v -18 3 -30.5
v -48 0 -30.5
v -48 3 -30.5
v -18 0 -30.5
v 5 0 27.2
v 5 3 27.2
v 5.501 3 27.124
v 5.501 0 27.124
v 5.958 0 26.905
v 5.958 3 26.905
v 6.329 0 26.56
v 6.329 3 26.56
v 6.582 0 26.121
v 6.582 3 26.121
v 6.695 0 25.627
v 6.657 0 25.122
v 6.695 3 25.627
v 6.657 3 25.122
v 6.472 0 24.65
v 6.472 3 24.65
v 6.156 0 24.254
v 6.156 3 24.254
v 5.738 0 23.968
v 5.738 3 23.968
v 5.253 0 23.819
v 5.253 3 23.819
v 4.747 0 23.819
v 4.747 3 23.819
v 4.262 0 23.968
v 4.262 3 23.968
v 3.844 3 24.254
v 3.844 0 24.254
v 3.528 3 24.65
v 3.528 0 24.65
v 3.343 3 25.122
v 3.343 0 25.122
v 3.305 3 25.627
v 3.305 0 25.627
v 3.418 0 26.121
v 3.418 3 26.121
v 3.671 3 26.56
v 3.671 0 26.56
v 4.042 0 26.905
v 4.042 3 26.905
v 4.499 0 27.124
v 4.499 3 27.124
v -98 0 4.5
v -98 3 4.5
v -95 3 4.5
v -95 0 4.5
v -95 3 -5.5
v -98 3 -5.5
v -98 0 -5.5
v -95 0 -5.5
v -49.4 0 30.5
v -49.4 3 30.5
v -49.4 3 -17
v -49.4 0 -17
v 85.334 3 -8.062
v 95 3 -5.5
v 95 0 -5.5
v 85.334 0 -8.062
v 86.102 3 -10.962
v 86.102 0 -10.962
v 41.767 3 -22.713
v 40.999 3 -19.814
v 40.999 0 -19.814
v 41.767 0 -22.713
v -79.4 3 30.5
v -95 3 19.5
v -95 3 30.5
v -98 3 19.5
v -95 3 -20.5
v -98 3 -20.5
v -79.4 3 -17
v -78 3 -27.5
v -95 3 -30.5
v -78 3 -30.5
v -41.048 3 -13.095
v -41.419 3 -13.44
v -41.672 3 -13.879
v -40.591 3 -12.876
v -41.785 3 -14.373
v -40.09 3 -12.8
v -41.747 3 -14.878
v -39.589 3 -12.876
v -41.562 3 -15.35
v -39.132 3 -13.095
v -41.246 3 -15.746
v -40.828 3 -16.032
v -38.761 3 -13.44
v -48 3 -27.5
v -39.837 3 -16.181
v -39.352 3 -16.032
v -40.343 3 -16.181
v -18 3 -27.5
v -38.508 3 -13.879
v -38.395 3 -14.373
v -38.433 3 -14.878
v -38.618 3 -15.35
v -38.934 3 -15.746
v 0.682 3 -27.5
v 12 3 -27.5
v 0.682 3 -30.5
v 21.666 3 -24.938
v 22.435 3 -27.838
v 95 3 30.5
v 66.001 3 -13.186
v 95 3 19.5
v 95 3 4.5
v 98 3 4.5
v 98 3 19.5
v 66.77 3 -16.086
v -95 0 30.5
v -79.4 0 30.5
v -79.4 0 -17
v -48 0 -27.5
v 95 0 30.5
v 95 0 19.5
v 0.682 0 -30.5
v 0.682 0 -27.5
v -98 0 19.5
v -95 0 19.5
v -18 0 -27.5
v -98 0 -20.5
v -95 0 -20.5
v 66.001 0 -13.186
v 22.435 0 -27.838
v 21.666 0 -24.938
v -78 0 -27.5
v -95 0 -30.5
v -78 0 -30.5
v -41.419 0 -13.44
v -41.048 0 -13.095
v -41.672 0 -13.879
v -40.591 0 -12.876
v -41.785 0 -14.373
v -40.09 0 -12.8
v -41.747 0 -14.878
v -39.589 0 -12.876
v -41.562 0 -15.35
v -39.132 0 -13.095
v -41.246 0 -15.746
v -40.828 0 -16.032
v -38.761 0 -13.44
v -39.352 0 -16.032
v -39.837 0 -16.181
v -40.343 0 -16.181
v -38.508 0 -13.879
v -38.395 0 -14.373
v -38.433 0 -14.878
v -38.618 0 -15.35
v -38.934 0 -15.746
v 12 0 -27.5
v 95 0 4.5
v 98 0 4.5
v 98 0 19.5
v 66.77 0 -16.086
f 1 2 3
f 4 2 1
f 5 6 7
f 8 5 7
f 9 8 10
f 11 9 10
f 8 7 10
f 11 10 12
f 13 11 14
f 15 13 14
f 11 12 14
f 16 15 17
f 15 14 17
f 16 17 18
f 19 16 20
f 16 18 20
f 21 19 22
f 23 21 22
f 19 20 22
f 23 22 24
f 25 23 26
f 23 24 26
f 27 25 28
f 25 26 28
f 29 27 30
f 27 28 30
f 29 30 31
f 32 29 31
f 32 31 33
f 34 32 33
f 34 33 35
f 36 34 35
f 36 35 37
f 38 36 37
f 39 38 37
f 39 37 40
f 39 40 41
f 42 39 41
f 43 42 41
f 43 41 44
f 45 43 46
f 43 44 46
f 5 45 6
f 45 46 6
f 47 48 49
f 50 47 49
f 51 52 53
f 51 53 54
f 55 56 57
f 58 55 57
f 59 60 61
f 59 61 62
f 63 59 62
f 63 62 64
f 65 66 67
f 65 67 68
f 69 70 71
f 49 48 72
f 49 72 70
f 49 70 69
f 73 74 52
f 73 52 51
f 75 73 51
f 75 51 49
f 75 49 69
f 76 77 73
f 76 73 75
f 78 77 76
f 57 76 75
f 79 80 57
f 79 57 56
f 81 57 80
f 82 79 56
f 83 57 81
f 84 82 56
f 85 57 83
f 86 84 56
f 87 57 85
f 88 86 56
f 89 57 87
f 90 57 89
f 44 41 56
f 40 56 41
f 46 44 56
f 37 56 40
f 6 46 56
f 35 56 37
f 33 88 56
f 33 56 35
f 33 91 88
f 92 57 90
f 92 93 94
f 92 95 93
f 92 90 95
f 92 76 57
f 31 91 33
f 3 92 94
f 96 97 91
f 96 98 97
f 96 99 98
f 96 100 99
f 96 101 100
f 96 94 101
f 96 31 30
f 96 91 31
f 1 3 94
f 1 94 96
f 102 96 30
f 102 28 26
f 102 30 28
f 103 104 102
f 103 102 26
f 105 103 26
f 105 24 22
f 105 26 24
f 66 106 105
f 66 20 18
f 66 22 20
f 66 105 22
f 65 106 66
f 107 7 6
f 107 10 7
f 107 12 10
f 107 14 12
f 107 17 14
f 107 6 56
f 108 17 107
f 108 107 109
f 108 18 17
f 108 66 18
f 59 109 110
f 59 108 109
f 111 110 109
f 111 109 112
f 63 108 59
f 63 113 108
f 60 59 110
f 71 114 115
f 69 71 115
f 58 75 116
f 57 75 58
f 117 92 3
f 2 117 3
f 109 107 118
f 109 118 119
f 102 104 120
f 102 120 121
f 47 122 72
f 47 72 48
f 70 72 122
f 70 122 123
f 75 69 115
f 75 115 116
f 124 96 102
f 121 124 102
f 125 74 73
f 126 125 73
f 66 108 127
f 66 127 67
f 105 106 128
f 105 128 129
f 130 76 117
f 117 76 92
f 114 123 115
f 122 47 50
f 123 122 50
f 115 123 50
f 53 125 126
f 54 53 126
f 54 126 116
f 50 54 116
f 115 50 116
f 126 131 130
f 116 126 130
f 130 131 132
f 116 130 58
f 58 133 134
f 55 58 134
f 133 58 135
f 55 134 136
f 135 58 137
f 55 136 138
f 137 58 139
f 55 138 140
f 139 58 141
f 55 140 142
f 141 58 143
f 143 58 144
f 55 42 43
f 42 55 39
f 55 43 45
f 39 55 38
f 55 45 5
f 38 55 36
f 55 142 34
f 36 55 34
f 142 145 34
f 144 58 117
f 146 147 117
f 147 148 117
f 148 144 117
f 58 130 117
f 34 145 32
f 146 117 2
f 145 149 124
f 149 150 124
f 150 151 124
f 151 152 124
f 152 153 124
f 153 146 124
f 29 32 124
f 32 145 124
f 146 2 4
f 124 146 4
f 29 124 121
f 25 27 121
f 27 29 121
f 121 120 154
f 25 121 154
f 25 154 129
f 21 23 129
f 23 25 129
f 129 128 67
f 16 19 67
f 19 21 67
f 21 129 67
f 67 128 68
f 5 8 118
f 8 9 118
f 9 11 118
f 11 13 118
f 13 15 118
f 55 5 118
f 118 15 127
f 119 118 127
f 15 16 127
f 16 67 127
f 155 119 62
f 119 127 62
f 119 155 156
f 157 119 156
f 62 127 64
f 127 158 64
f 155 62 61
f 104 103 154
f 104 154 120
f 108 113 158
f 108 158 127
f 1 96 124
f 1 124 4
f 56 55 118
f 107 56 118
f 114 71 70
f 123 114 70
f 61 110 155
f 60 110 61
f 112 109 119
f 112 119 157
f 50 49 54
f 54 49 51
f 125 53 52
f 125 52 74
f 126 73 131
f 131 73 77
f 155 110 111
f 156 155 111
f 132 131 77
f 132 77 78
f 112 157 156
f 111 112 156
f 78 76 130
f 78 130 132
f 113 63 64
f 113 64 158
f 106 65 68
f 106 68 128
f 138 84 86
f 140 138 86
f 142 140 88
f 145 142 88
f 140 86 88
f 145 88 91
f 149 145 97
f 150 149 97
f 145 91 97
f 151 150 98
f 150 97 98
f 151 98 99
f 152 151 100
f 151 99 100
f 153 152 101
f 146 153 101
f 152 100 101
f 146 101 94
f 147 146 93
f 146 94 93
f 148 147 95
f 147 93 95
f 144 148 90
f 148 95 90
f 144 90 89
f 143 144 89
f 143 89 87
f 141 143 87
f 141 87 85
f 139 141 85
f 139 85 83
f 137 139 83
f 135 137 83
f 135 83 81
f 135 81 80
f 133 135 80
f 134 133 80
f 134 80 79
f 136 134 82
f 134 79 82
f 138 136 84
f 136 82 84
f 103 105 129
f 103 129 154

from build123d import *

# Parameters (mm, degrees)
SKETCH1_W           = 196
SKETCH1_H           = 61
BOSS_EXTRUDE1_DEPTH = 3
SKETCH2_R           = 1.7
SKETCH2_W           = 30
SKETCH2_H           = 47.5
SKETCH2_W_2         = 3
SKETCH2_H_2         = 10
SKETCH2_H_3         = 11
SKETCH2_H_4         = 3
CUT_EXTRUDE1_DEPTH  = 3
CUT_EXTRUDE2_DEPTH  = 10
BOSS_EXTRUDE2_DEPTH = 3


with BuildPart() as part:
    # Sketch1 → Boss-Extrude1 (new body)
    with BuildSketch(Plane(origin=(0, 0, 0), x_dir=(1, 0, 0), z_dir=(0, 1, 0))):
        Rectangle(SKETCH1_W, SKETCH1_H)
    extrude(amount=BOSS_EXTRUDE1_DEPTH)

    # Sketch2 → Cut-Extrude1 (cut)
    with BuildSketch(Plane(origin=(0, 3, 0), x_dir=(1, 0, 0), z_dir=(0, 1, 0))):
        with Locations(Location((-40.09, 14.5, 0), (0, 0, 270))):
            Circle(SKETCH2_R)
        with Locations(Location((5, -25.5, 0), (0, 0, 270))):
            Circle(SKETCH2_R)
        with Locations((-64.4, -6.75)):
            Rectangle(SKETCH2_W, SKETCH2_H)
        with Locations((-96.5, 25.5)):
            Rectangle(SKETCH2_W_2, SKETCH2_H_2)
        with Locations((-96.5, 0.5)):
            Rectangle(SKETCH2_W_2, SKETCH2_H_2)
        with Locations((-96.5, -25)):
            Rectangle(SKETCH2_W_2, SKETCH2_H_3)
        with Locations((96.5, 0.5)):
            Rectangle(SKETCH2_W_2, SKETCH2_H_2)
        with Locations((96.5, -25)):
            Rectangle(SKETCH2_W_2, SKETCH2_H_3)
        with Locations((-3, 29)):
            Rectangle(SKETCH2_W, SKETCH2_H_4)
        with Locations((-63, 29)):
            Rectangle(SKETCH2_W, SKETCH2_H_4)
        with Locations((57, 29)):
            Rectangle(SKETCH2_W, SKETCH2_H_4)
        with Locations((96.5, 25.5)):
            Rectangle(SKETCH2_W_2, SKETCH2_H_2)
    extrude(amount=-CUT_EXTRUDE1_DEPTH, mode=Mode.SUBTRACT)

    # Sketch3 → Cut-Extrude2 (cut)
    with BuildSketch(Plane(origin=(0, 3, 0), x_dir=(1, 0, 0), z_dir=(0, 1, 0))):
        Polygon((12, 30.5), (98, 30.5), (98, 5.5), (95, 5.5), (85.333795578, 8.062126473), (86.10243352, 10.9619878), (66.770024675, 16.086240747), (66.001386733, 13.18637942), (40.998613267, 19.81362058), (41.767251209, 22.713481907), (22.434842364, 27.837734853), (21.666204422, 24.937873527), (12, 27.5), align=None)
    extrude(amount=-CUT_EXTRUDE2_DEPTH, mode=Mode.SUBTRACT)

    # Sketch5 → Boss-Extrude2 (add)
    with BuildSketch(Plane(origin=(0, 3, 0), x_dir=(1, 0, 0), z_dir=(0, 1, 0))):
        Polygon((12, 27.5), (0.681818182, 30.5), (0.681818182, 27.5), align=None)
    extrude(amount=-BOSS_EXTRUDE2_DEPTH)


solid = part.part
